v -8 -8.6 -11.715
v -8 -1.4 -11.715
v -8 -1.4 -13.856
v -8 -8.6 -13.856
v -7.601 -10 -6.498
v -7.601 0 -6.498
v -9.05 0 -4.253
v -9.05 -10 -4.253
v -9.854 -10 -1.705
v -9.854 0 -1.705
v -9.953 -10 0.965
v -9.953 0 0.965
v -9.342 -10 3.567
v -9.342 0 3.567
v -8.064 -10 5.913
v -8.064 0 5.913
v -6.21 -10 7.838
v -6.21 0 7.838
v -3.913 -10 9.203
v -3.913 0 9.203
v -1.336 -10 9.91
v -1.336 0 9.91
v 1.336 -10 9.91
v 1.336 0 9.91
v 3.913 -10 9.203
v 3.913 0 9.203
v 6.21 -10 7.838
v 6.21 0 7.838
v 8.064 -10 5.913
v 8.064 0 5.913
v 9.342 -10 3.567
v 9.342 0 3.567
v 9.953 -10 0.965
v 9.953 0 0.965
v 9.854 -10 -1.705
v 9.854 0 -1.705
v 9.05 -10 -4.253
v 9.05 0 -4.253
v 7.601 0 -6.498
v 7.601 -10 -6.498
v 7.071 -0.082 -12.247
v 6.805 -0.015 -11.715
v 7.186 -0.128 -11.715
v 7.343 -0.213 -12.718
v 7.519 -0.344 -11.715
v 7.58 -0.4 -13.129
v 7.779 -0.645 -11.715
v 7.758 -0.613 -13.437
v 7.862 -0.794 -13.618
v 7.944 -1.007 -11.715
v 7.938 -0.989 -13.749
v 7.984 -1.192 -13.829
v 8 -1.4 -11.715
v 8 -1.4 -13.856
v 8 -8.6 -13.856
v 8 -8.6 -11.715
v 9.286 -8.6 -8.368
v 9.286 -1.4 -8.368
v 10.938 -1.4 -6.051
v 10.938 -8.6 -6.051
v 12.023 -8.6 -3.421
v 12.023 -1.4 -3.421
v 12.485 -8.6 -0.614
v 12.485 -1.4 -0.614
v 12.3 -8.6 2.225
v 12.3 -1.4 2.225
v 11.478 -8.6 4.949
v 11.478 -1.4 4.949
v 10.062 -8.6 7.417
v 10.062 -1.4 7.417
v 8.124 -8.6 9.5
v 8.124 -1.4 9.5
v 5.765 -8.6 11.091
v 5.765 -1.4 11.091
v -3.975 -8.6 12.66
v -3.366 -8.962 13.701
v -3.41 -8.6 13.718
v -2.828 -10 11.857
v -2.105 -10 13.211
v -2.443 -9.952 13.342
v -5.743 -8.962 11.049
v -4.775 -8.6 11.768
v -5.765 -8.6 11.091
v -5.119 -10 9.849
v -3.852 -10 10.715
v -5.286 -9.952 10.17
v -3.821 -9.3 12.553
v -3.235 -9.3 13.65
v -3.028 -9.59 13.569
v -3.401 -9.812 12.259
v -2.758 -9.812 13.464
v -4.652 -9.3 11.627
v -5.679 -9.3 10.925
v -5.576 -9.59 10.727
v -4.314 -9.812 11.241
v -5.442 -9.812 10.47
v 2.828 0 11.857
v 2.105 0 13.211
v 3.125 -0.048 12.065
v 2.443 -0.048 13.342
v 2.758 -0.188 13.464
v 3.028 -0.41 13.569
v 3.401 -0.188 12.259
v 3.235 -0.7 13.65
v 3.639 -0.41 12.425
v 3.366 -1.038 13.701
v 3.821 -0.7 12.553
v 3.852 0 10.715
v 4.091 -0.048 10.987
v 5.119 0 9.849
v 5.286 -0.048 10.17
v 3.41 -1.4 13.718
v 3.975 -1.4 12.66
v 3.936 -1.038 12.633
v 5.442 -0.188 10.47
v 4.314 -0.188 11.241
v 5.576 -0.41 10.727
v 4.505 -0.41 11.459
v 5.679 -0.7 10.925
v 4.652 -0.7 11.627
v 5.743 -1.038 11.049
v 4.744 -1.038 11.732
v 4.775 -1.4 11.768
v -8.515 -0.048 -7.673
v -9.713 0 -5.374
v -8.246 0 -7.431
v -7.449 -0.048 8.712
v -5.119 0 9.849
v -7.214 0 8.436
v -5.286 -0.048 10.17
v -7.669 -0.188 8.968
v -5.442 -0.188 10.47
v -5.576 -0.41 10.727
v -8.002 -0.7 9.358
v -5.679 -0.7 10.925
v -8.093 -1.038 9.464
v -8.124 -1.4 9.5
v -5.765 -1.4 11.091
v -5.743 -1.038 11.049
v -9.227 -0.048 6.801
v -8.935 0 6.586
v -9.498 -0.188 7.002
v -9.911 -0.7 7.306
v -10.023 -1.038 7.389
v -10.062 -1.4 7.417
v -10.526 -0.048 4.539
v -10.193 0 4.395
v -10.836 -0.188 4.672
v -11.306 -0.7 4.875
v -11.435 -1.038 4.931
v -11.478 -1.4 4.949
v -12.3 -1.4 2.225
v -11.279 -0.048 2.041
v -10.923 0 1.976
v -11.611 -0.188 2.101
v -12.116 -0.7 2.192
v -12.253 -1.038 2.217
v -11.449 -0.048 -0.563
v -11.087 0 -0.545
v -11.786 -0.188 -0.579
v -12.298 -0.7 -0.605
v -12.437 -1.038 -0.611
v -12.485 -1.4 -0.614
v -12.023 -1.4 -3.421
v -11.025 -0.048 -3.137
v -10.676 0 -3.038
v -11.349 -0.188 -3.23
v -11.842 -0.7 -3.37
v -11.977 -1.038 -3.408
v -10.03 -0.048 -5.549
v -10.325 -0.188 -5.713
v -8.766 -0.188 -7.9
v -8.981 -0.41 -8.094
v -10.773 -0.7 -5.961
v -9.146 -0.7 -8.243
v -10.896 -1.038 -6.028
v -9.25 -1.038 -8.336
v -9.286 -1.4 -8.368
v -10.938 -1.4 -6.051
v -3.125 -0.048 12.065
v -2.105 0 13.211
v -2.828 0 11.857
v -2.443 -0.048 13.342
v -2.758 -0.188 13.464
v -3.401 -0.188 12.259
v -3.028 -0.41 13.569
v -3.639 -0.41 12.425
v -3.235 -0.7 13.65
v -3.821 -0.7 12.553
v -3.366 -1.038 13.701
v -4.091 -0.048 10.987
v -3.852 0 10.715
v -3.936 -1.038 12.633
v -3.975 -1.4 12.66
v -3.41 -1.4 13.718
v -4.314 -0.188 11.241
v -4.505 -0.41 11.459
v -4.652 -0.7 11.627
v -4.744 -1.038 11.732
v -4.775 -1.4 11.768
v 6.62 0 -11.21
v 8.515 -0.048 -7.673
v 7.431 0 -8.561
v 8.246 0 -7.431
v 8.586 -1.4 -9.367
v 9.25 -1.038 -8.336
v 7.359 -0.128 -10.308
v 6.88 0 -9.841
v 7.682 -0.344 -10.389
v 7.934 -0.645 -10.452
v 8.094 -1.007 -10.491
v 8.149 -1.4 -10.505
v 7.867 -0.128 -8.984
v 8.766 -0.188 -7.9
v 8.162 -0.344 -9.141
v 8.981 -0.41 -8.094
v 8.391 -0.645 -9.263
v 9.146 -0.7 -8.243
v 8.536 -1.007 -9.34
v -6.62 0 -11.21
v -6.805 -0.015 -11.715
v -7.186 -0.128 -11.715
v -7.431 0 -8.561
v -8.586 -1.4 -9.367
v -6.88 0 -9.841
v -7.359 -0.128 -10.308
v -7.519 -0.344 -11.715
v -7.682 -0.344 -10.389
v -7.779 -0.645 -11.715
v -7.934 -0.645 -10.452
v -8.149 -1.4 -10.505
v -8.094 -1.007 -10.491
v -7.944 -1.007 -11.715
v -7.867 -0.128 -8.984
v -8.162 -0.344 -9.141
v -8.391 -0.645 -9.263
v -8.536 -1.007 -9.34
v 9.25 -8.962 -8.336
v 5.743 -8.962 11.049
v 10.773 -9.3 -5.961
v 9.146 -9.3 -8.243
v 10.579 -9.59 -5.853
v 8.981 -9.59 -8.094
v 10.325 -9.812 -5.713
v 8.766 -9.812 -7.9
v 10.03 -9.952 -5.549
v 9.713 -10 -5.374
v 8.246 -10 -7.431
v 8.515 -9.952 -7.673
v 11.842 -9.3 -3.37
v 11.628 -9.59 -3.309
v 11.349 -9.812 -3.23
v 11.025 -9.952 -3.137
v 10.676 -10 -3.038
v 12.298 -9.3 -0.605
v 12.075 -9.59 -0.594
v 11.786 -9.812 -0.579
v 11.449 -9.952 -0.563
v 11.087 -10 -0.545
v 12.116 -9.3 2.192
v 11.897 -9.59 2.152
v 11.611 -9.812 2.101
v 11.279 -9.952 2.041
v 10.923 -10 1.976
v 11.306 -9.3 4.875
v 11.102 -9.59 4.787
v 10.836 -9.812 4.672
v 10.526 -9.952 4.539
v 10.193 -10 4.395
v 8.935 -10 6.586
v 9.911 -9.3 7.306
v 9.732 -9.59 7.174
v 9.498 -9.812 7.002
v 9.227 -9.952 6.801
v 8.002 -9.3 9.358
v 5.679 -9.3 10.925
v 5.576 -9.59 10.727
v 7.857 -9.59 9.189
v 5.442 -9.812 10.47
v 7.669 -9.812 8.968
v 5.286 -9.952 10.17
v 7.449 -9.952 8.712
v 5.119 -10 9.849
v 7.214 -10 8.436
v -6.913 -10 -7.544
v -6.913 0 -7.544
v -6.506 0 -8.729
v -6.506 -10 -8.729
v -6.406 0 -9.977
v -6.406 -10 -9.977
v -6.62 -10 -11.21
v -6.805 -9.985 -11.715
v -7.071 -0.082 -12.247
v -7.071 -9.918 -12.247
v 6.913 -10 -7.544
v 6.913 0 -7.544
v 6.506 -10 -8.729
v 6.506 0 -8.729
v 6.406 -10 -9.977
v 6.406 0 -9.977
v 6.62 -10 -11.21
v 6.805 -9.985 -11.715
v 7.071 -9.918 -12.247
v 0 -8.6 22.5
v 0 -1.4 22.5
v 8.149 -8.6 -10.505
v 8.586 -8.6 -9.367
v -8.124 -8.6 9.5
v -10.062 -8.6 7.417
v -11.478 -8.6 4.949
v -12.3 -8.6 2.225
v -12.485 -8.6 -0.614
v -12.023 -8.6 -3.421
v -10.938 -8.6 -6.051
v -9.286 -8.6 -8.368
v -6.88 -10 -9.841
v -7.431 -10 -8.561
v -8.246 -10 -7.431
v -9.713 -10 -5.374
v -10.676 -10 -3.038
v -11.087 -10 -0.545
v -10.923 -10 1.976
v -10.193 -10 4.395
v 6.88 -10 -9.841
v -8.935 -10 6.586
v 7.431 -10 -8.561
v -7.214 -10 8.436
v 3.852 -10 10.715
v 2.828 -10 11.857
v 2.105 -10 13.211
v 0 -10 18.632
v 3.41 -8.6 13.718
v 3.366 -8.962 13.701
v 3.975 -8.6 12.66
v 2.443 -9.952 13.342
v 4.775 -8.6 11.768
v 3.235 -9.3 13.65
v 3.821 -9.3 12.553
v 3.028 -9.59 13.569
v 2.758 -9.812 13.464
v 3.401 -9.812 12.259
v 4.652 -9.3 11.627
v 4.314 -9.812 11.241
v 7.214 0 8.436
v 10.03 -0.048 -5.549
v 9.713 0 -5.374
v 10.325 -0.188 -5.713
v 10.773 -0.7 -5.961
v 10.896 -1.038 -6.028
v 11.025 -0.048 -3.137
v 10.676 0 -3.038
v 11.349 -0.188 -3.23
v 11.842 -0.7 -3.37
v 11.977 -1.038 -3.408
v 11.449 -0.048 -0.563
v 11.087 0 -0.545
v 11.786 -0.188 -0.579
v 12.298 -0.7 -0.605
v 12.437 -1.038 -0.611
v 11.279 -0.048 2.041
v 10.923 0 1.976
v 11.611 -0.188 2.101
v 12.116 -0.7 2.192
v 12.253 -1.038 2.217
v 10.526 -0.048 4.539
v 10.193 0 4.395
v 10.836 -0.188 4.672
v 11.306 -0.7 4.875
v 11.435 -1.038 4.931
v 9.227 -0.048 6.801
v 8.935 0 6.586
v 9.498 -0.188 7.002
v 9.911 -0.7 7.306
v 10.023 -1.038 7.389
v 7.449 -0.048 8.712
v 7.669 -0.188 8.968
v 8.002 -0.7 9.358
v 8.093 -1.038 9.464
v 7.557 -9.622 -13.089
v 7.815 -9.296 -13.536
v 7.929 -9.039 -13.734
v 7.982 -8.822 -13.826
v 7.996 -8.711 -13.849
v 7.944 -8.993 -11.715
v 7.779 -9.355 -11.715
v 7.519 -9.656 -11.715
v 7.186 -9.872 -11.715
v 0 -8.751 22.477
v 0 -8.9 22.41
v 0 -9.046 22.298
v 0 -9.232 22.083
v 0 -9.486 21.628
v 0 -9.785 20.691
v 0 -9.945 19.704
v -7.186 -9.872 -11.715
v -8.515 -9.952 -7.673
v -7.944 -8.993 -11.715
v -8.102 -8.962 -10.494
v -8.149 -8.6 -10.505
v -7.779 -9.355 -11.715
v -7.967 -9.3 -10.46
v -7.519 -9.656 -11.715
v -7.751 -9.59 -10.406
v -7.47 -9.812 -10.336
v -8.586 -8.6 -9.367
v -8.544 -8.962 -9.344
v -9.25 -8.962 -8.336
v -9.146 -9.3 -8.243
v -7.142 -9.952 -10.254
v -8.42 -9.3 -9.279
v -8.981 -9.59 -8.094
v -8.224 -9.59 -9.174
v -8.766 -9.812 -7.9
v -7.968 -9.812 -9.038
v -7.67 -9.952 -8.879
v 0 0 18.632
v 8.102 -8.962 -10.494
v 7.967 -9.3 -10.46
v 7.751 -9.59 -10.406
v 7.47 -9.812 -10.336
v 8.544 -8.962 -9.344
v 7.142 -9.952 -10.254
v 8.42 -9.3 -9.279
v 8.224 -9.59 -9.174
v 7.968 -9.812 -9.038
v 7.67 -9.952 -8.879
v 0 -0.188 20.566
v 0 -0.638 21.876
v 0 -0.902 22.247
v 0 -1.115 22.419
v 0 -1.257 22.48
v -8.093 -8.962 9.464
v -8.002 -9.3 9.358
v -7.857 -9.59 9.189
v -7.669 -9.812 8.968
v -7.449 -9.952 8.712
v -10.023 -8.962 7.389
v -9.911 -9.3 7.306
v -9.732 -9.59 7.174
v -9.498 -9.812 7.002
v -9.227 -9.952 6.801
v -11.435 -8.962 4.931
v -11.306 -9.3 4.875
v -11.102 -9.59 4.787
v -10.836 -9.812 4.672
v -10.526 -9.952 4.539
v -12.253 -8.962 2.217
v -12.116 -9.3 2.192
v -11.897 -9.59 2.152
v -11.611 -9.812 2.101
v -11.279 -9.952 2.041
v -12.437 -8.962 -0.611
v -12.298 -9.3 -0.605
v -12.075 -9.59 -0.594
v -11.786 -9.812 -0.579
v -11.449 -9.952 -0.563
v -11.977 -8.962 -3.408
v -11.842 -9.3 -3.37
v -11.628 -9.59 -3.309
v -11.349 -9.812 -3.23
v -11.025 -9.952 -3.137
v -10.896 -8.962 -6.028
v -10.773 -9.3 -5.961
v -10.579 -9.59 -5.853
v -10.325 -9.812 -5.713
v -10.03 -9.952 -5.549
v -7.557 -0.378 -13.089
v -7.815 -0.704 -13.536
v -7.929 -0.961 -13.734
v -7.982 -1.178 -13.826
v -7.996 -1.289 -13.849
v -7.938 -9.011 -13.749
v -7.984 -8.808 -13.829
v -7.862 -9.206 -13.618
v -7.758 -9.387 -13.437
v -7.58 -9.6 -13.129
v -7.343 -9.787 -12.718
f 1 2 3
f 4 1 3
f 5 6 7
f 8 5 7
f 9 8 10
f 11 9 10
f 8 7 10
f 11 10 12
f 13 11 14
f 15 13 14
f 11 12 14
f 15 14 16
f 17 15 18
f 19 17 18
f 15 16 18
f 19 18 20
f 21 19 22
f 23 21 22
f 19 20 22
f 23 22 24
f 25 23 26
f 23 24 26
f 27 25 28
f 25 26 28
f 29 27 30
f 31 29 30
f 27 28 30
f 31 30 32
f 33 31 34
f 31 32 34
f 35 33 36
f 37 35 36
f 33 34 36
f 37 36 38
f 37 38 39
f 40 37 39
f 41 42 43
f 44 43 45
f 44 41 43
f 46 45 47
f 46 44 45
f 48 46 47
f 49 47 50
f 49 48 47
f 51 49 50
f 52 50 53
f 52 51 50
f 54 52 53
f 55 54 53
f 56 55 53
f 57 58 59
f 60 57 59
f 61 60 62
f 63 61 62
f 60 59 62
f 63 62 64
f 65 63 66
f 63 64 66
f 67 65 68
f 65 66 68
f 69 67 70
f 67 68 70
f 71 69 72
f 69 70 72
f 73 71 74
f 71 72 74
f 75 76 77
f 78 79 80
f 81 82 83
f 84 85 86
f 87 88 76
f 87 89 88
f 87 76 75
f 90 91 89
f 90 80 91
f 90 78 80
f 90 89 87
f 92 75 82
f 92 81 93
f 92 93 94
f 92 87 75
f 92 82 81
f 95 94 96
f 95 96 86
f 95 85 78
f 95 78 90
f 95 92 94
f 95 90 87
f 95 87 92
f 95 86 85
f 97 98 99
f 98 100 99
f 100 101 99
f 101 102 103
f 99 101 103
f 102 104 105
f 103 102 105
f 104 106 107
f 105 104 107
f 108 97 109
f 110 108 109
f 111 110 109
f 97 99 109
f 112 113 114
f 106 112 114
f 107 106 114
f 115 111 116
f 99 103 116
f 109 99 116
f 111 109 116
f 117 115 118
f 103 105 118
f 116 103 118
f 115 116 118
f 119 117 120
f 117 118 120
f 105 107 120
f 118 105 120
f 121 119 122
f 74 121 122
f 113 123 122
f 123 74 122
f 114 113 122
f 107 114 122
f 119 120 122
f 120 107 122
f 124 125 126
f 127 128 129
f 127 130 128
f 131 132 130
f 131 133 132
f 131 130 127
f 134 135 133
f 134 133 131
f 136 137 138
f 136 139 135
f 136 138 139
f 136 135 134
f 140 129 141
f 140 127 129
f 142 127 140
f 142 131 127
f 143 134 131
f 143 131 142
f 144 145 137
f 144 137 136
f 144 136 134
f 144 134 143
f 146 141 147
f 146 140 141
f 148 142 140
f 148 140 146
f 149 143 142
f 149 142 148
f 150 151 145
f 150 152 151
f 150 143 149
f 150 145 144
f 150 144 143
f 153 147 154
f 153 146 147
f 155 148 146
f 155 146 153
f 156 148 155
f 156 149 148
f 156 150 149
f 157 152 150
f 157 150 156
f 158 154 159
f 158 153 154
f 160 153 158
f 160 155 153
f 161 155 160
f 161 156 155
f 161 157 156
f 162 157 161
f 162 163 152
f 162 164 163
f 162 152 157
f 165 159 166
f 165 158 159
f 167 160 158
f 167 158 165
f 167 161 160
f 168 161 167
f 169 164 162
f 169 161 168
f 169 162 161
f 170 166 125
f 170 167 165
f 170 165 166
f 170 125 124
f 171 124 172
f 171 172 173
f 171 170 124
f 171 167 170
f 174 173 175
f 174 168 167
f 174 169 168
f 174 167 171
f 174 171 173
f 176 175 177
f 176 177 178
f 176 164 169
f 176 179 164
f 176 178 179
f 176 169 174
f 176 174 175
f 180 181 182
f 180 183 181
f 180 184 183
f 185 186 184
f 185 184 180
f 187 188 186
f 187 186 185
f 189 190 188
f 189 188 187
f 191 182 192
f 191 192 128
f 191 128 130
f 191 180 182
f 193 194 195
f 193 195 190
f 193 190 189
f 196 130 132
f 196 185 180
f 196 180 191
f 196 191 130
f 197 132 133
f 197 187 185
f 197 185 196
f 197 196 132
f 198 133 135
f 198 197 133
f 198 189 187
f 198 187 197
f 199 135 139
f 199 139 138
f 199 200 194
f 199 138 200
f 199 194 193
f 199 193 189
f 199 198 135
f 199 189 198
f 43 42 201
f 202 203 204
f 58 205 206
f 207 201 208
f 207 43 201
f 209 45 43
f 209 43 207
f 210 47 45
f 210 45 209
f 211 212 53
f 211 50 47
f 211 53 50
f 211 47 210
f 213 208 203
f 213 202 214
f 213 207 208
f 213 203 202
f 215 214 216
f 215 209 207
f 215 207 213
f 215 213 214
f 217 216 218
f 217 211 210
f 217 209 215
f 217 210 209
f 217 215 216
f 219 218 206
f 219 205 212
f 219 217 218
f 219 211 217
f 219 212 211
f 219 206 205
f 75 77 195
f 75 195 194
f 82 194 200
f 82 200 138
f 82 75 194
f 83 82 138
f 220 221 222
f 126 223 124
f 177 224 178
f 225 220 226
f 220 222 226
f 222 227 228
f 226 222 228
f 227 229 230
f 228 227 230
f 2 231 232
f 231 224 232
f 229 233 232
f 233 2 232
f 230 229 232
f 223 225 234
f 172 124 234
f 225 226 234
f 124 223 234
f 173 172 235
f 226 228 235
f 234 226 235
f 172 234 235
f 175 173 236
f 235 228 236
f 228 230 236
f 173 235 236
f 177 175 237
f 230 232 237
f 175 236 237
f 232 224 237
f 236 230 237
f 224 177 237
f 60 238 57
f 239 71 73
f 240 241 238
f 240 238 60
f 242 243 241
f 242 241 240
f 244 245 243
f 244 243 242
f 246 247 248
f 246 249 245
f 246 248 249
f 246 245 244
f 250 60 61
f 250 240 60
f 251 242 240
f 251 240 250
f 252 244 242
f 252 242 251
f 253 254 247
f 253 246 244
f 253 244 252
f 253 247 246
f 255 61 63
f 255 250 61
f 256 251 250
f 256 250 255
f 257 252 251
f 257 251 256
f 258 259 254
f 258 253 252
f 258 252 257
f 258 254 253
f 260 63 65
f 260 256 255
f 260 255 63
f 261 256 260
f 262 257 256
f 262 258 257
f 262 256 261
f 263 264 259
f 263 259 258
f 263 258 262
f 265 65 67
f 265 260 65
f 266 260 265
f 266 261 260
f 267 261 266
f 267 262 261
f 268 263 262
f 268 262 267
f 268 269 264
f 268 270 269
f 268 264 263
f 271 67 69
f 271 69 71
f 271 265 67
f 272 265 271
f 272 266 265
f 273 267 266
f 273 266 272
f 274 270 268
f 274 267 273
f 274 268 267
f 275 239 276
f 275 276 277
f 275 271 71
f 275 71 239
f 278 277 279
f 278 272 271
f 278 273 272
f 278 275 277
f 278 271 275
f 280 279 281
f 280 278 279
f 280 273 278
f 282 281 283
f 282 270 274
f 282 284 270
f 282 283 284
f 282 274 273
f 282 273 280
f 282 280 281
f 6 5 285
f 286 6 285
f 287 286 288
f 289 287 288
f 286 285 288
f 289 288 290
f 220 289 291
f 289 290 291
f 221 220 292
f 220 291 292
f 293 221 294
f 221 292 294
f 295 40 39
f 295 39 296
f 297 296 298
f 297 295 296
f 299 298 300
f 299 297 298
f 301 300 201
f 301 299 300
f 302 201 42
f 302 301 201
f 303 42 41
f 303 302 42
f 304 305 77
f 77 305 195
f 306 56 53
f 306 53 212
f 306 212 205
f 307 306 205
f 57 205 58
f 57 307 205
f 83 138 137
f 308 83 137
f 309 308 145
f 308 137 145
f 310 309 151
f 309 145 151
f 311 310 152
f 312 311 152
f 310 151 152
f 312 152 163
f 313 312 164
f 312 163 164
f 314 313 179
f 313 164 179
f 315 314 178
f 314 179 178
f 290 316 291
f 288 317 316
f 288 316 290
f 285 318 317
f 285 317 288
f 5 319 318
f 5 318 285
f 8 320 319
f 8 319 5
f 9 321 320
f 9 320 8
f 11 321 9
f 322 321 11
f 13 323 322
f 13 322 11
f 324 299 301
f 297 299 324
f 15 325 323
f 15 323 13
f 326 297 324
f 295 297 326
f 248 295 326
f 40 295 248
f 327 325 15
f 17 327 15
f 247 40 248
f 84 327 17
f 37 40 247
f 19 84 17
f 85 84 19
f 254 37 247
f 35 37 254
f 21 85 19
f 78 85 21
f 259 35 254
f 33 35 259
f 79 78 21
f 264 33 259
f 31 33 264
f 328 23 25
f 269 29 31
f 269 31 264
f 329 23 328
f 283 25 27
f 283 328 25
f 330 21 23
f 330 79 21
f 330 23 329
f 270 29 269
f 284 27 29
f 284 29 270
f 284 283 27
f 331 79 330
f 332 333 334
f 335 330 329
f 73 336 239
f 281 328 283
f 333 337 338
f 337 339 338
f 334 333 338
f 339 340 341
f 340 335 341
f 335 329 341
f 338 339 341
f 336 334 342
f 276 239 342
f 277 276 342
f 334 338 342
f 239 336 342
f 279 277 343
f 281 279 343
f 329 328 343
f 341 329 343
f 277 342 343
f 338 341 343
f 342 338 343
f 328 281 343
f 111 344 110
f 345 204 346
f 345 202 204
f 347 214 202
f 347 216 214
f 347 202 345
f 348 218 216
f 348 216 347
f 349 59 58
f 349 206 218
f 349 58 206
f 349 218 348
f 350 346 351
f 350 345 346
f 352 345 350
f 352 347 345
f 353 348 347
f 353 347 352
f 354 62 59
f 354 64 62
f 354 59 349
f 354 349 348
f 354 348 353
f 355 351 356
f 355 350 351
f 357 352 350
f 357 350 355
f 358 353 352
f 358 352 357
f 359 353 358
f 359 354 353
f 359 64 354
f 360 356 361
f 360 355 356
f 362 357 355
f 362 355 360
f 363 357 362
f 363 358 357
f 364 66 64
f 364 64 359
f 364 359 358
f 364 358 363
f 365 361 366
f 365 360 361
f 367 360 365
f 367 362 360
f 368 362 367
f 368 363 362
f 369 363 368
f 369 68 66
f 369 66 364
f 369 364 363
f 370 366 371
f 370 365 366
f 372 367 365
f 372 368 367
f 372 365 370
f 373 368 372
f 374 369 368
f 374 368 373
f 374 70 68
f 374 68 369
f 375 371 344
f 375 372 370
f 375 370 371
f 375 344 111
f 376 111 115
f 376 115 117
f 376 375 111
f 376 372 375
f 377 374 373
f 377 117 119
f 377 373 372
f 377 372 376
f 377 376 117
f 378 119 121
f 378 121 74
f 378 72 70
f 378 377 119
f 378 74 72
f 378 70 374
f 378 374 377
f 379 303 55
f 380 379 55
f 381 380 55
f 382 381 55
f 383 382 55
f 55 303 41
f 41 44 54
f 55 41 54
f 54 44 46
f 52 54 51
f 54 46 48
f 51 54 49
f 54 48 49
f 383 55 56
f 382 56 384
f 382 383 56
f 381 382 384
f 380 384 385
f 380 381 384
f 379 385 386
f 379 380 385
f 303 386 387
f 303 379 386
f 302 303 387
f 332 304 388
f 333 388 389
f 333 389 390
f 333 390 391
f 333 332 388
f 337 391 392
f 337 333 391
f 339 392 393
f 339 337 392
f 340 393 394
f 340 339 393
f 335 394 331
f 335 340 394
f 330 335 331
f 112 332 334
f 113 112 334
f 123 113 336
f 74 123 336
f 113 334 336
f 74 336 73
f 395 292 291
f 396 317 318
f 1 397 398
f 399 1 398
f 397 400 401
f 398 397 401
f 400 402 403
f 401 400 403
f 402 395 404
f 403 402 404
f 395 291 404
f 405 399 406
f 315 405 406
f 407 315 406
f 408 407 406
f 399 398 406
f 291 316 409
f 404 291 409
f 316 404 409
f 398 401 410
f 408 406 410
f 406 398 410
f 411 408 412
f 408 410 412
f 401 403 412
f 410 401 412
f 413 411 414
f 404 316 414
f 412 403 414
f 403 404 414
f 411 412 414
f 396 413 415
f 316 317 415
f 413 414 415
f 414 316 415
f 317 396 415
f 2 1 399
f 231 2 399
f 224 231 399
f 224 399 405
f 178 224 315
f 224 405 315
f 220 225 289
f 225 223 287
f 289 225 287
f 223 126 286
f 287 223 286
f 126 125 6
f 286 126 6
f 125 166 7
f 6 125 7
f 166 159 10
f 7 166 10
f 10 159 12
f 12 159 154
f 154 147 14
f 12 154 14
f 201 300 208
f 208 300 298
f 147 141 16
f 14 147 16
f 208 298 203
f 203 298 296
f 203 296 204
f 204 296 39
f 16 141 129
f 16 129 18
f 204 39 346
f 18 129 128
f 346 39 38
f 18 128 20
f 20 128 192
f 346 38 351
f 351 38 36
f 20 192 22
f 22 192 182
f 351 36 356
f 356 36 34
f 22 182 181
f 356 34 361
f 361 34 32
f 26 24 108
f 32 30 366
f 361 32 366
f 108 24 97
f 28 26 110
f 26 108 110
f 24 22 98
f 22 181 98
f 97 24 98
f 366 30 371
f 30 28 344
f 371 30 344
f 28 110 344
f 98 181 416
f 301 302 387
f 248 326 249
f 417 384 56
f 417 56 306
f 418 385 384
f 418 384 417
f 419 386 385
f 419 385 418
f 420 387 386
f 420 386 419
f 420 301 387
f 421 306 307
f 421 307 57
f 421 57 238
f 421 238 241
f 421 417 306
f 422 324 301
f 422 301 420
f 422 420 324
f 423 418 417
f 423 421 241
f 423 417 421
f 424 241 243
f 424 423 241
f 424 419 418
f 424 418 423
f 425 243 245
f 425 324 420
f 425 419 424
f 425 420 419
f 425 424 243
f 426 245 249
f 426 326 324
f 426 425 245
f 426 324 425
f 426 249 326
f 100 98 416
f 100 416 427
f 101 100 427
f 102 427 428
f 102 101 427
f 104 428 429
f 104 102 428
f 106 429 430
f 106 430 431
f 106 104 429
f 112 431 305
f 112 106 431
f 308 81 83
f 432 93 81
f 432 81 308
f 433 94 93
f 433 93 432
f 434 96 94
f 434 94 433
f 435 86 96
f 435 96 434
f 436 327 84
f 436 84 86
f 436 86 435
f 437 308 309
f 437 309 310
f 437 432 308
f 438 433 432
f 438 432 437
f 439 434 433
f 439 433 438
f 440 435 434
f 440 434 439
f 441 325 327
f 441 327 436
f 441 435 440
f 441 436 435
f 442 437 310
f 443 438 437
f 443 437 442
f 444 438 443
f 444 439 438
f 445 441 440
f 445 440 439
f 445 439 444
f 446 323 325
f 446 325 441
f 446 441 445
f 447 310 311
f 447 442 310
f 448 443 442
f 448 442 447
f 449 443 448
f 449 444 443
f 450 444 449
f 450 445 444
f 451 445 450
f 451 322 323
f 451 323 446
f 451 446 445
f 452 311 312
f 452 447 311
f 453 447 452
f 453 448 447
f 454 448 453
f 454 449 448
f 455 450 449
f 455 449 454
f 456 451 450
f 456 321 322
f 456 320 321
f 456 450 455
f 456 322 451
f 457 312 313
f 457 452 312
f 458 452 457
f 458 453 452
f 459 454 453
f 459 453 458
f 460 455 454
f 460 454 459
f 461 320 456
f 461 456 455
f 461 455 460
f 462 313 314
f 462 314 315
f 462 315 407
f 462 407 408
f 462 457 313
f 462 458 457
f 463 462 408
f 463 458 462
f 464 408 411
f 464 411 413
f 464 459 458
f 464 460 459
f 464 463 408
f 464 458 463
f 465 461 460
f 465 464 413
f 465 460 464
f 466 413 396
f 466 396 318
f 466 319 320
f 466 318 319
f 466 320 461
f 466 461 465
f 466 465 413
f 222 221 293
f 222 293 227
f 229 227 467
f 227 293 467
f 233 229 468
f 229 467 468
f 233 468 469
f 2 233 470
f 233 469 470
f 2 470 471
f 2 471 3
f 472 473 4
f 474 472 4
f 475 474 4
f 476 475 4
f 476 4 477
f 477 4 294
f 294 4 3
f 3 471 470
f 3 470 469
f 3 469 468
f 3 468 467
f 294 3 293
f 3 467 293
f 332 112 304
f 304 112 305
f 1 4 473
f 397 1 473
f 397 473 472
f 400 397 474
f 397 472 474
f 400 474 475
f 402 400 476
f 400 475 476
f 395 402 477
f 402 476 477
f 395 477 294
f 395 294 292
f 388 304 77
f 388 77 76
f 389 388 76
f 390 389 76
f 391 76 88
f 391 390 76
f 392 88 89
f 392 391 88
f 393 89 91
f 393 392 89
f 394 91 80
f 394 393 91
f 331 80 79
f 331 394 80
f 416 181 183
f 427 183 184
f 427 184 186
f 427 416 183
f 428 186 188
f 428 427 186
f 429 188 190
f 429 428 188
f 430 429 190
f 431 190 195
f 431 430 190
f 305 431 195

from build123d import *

# Parameters (mm, degrees)
F1_DEPTH     = 10
F2_R         = 5
F3_R         = 5
F4_R         = 5
F5_R         = 5
F6_R         = 5
F7_T1_DEPTH  = 12.9209860369
F7_T3_DEPTH  = 12.9209860369
F7_T5_DEPTH  = 5.6410319467
F7_T8_ANGLE  = 41.3143422779
F7_T10_ANGLE = 104.5599421702
F7_T12_ANGLE = 42.0246275794
F7_T14_ANGLE = 41.3143422779
F7_T16_ANGLE = 104.5599421702
F7_T18_ANGLE = 42.0246275794
F8_T1_DEPTH  = 12.9209860369
F8_T3_DEPTH  = 12.9209860369
F8_T5_DEPTH  = 5.6410319467
F8_T8_ANGLE  = 42.0246275794
F8_T10_ANGLE = 42.0246275794
F8_T12_ANGLE = 104.5599421702
F8_T14_ANGLE = 104.5599421702
F8_T16_ANGLE = 41.3143422779
F8_T18_ANGLE = 41.3143422779


# Not quite as in the source:
# - a fillet or chamfer that OpenCascade refuses, or shapes differently, is made with other operations: its cross-section is extruded or revolved along the edge and cut away or added


with BuildPart() as f1:
    # F0 (on Front) → F1 (new body)
    with BuildSketch(Plane.XZ):
        with BuildLine():
            ThreePointArc((-5, -8.6602540378), (0, 10), (5, -8.6602540378))
            Line((5, -8.6602540378), (6.25, -10.8253175473))
            Line((6.25, -10.8253175473), (8, -13.8564064606))
            Line((8, -13.8564064606), (8, -9.6046863561))
            ThreePointArc((8, -9.6046863561), (12.3033115605, 2.2087382474), (4.1595701998, 11.7876195965))
            ThreePointArc((4.1595701998, 11.7876195965), (0, 12.5), (-4.1595701998, 11.7876195965))
            ThreePointArc((-4.1595701998, 11.7876195965), (-12.3033115605, 2.2087382474), (-8, -9.6046863561))
            Line((-8, -9.6046863561), (-8, -13.8564064606))
            Line((-8, -13.8564064606), (-6.25, -10.8253175473))
            Line((-6.25, -10.8253175473), (-5, -8.6602540378))
        make_face()
        with BuildLine():
            ThreePointArc((-4.1595701998, 11.7876195965), (0, 12.5), (4.1595701998, 11.7876195965))
            Line((4.1595701998, 11.7876195965), (0, 22.5))
            Line((0, 22.5), (-4.1595701998, 11.7876195965))
        make_face()
    extrude(amount=F1_DEPTH)

    # F2
    f2_edges = [f1.edges().sort_by_distance(p)[0] for p in [
        (-4.15957, -5, 11.78762),
    ]]
    fillet(f2_edges, radius=F2_R)

    # F3
    f3_edges = [f1.edges().sort_by_distance(p)[0] for p in [
        (4.15957, -5, 11.78762),
    ]]
    fillet(f3_edges, radius=F3_R)

    # F4
    f4_edges = [f1.edges().sort_by_distance(p)[0] for p in [
        (-5, -5, -8.660254),
    ]]
    fillet(f4_edges, radius=F4_R)

    # F5
    f5_edges = [f1.edges().sort_by_distance(p)[0] for p in [
        (-8, -5, -9.604686),
    ]]
    fillet(f5_edges, radius=F5_R)

    # F6
    f6_edges = [f1.edges().sort_by_distance(p)[0] for p in [
        (8, -5, -9.604686),
        (5, -5, -8.660254),
    ]]
    fillet(f6_edges, radius=F6_R)

    # F7: fillet of radius 1.4 on 2 edges, made by hand

    # F7_s2 → F7_t1 (cut)
    with BuildSketch(Plane(origin=(-4.1819067631, 0, 10.7699050398), x_dir=(0, 1, 0), z_dir=(-0.3619658098, 0, 0.9321913712))):
        with BuildLine():
            ThreePointArc((-8.6, -8.1442307215), (-9.5899494937, -7.7341802151), (-10, -6.7442307215))
            Line((-10, -6.7442307215), (-10, -8.1442307215))
            Line((-10, -8.1442307215), (-8.6, -8.1442307215))
        make_face()
    extrude(amount=F7_T1_DEPTH, mode=Mode.SUBTRACT)

    # F7_s4 → F7_t3 (cut)
    with BuildSketch(Plane(origin=(8.8588619379, 0, 22.8147367305), x_dir=(0, 1, 0), z_dir=(-0.3619658098, 0, -0.9321913712))):
        with BuildLine():
            ThreePointArc((-8.6, -8.1442307215), (-9.5899494937, -7.7341802151), (-10, -6.7442307215))
            Line((-10, -6.7442307215), (-10, -8.1442307215))
            Line((-10, -8.1442307215), (-8.6, -8.1442307215))
        make_face()
    extrude(amount=F7_T3_DEPTH, mode=Mode.SUBTRACT)

    # F7_s6 → F7_t5 (cut)
    with BuildSketch(Plane.XY.offset(-17.3564064606)):
        with BuildLine():
            ThreePointArc((-8, -8.6), (-7.5899494937, -9.5899494937), (-6.6, -10))
            Line((-6.6, -10), (-8, -10))
            Line((-8, -10), (-8, -8.6))
        make_face()
        with BuildLine():
            ThreePointArc((8, -8.6), (7.5899494937, -9.5899494937), (6.6, -10))
            Line((6.6, -10), (8, -10))
            Line((8, -10), (8, -8.6))
        make_face()
    extrude(amount=F7_T5_DEPTH, mode=Mode.SUBTRACT)

    # F7_s7 → F7_t8 (revolve, cut)
    with BuildSketch(Plane(origin=(4.1819067631, 0, 10.7699050398), x_dir=(0, 1, 0), z_dir=(0.3619658098, 0, 0.9321913712))):
        with BuildLine():
            ThreePointArc((-8.6, 8.1442307215), (-9.5899494937, 7.7341802151), (-10, 6.7442307215))
            Line((-10, 6.7442307215), (-10, 8.1442307215))
            Line((-10, 8.1442307215), (-8.6, 8.1442307215))
        make_face()
    revolve(axis=Axis((-8.0710316963, -10, 15.5276671576), (0, 1, 0)), revolution_arc=F7_T8_ANGLE, mode=Mode.SUBTRACT)

    # F7_s9 → F7_t10 (revolve, cut)
    with BuildSketch(Plane(origin=(0, 0, 0), x_dir=(0, 1, 0), z_dir=(0.8872952661, 0, 0.4612018112))):
        with BuildLine():
            ThreePointArc((-8.6, 12.5), (-9.5899494937, 12.0899494937), (-10, 11.1))
            Line((-10, 11.1), (-10, 12.5))
            Line((-10, 12.5), (-8.6, 12.5))
        make_face()
    revolve(axis=Axis((0, -10, 0), (0, -1, 0)), revolution_arc=F7_T10_ANGLE, mode=Mode.SUBTRACT)

    # F7_s11 → F7_t12 (revolve, cut)
    with BuildSketch(Plane.XY.offset(-11.7153745139)):
        with BuildLine():
            ThreePointArc((-8, -8.6), (-7.5899494937, -9.5899494937), (-6.6, -10))
            Line((-6.6, -10), (-8, -10))
            Line((-8, -10), (-8, -8.6))
        make_face()
    revolve(axis=Axis((-13, -10, -11.7153745139), (0, -1, 0)), revolution_arc=F7_T12_ANGLE, mode=Mode.SUBTRACT)

    # F7_s13 → F7_t14 (revolve, cut)
    with BuildSketch(Plane(origin=(-4.1819067631, 0, 10.7699050398), x_dir=(0, 1, 0), z_dir=(-0.3619658098, 0, 0.9321913712))):
        with BuildLine():
            ThreePointArc((-8.6, -8.1442307215), (-9.5899494937, -7.7341802151), (-10, -6.7442307215))
            Line((-10, -6.7442307215), (-10, -8.1442307215))
            Line((-10, -8.1442307215), (-8.6, -8.1442307215))
        make_face()
    revolve(axis=Axis((8.0710316963, -10, 15.5276671576), (0, -1, 0)), revolution_arc=F7_T14_ANGLE, mode=Mode.SUBTRACT)

    # F7_s15 → F7_t16 (revolve, cut)
    with BuildSketch(Plane(origin=(0, 0, 0), x_dir=(0, 1, 0), z_dir=(-0.6694499722, 0, -0.7428571429))):
        with BuildLine():
            ThreePointArc((-8.6, 12.5), (-9.5899494937, 12.0899494937), (-10, 11.1))
            Line((-10, 11.1), (-10, 12.5))
            Line((-10, 12.5), (-8.6, 12.5))
        make_face()
    revolve(axis=Axis((0, -10, 0), (0, -1, 0)), revolution_arc=F7_T16_ANGLE, mode=Mode.SUBTRACT)

    # F7_s17 → F7_t18 (revolve, cut)
    with BuildSketch(Plane.XY.offset(-11.7153745139)):
        with BuildLine():
            ThreePointArc((8, -8.6), (7.5899494937, -9.5899494937), (6.6, -10))
            Line((6.6, -10), (8, -10))
            Line((8, -10), (8, -8.6))
        make_face()
    revolve(axis=Axis((13, -10, -11.7153745139), (0, 1, 0)), revolution_arc=F7_T18_ANGLE, mode=Mode.SUBTRACT)

    # F8: fillet of radius 1.4 on 8 edges, made by hand

    # F8_s2 → F8_t1 (cut)
    with BuildSketch(Plane(origin=(-4.1819067631, 0, 10.7699050398), x_dir=(0, 1, 0), z_dir=(-0.3619658098, 0, 0.9321913712))):
        with BuildLine():
            ThreePointArc((0, -6.7442307215), (-0.4100505063, -7.7341802151), (-1.4, -8.1442307215))
            Line((-1.4, -8.1442307215), (0, -8.1442307215))
            Line((0, -8.1442307215), (0, -6.7442307215))
        make_face()
    extrude(amount=F8_T1_DEPTH, mode=Mode.SUBTRACT)

    # F8_s4 → F8_t3 (cut)
    with BuildSketch(Plane(origin=(8.8588619379, 0, 22.8147367305), x_dir=(0, 1, 0), z_dir=(-0.3619658098, 0, -0.9321913712))):
        with BuildLine():
            ThreePointArc((0, -6.7442307215), (-0.4100505063, -7.7341802151), (-1.4, -8.1442307215))
            Line((-1.4, -8.1442307215), (0, -8.1442307215))
            Line((0, -8.1442307215), (0, -6.7442307215))
        make_face()
    extrude(amount=F8_T3_DEPTH, mode=Mode.SUBTRACT)

    # F8_s6 → F8_t5 (cut)
    with BuildSketch(Plane.XY.offset(-17.3564064606)):
        with BuildLine():
            ThreePointArc((-6.6, 0), (-7.5899494937, -0.4100505063), (-8, -1.4))
            Line((-8, -1.4), (-8, 0))
            Line((-8, 0), (-6.6, 0))
        make_face()
        with BuildLine():
            ThreePointArc((6.6, 0), (7.5899494937, -0.4100505063), (8, -1.4))
            Line((8, -1.4), (8, 0))
            Line((8, 0), (6.6, 0))
        make_face()
    extrude(amount=F8_T5_DEPTH, mode=Mode.SUBTRACT)

    # F8_s7 → F8_t8 (revolve, cut)
    with BuildSketch(Plane.XY.offset(-11.7153745139)):
        with BuildLine():
            ThreePointArc((6.6, 0), (7.5899494937, -0.4100505063), (8, -1.4))
            Line((8, -1.4), (8, 0))
            Line((8, 0), (6.6, 0))
        make_face()
    revolve(axis=Axis((13, 0, -11.7153745139), (0, 1, 0)), revolution_arc=F8_T8_ANGLE, mode=Mode.SUBTRACT)

    # F8_s9 → F8_t10 (revolve, cut)
    with BuildSketch(Plane.XY.offset(-11.7153745139)):
        with BuildLine():
            ThreePointArc((-6.6, 0), (-7.5899494937, -0.4100505063), (-8, -1.4))
            Line((-8, -1.4), (-8, 0))
            Line((-8, 0), (-6.6, 0))
        make_face()
    revolve(axis=Axis((-13, 0, -11.7153745139), (0, -1, 0)), revolution_arc=F8_T10_ANGLE, mode=Mode.SUBTRACT)

    # F8_s11 → F8_t12 (revolve, cut)
    with BuildSketch(Plane(origin=(0, 0, 0), x_dir=(0, 1, 0), z_dir=(-0.6694499722, 0, -0.7428571429))):
        with BuildLine():
            ThreePointArc((0, 11.1), (-0.4100505063, 12.0899494937), (-1.4, 12.5))
            Line((-1.4, 12.5), (0, 12.5))
            Line((0, 12.5), (0, 11.1))
        make_face()
    revolve(axis=Axis((0, 0, 0), (0, -1, 0)), revolution_arc=F8_T12_ANGLE, mode=Mode.SUBTRACT)

    # F8_s13 → F8_t14 (revolve, cut)
    with BuildSketch(Plane(origin=(0, 0, 0), x_dir=(0, 1, 0), z_dir=(0.8872952661, 0, 0.4612018112))):
        with BuildLine():
            ThreePointArc((0, 11.1), (-0.4100505063, 12.0899494937), (-1.4, 12.5))
            Line((-1.4, 12.5), (0, 12.5))
            Line((0, 12.5), (0, 11.1))
        make_face()
    revolve(axis=Axis((0, 0, 0), (0, -1, 0)), revolution_arc=F8_T14_ANGLE, mode=Mode.SUBTRACT)

    # F8_s15 → F8_t16 (revolve, cut)
    with BuildSketch(Plane(origin=(-4.1819067631, 0, 10.7699050398), x_dir=(0, 1, 0), z_dir=(-0.3619658098, 0, 0.9321913712))):
        with BuildLine():
            ThreePointArc((0, -6.7442307215), (-0.4100505063, -7.7341802151), (-1.4, -8.1442307215))
            Line((-1.4, -8.1442307215), (0, -8.1442307215))
            Line((0, -8.1442307215), (0, -6.7442307215))
        make_face()
    revolve(axis=Axis((8.0710316963, 0, 15.5276671576), (0, -1, 0)), revolution_arc=F8_T16_ANGLE, mode=Mode.SUBTRACT)

    # F8_s17 → F8_t18 (revolve, cut)
    with BuildSketch(Plane(origin=(4.1819067631, 0, 10.7699050398), x_dir=(0, 1, 0), z_dir=(0.3619658098, 0, 0.9321913712))):
        with BuildLine():
            ThreePointArc((0, 6.7442307215), (-0.4100505063, 7.7341802151), (-1.4, 8.1442307215))
            Line((-1.4, 8.1442307215), (0, 8.1442307215))
            Line((0, 8.1442307215), (0, 6.7442307215))
        make_face()
    revolve(axis=Axis((-8.0710316963, 0, 15.5276671576), (0, 1, 0)), revolution_arc=F8_T18_ANGLE, mode=Mode.SUBTRACT)


solid = f1.part
